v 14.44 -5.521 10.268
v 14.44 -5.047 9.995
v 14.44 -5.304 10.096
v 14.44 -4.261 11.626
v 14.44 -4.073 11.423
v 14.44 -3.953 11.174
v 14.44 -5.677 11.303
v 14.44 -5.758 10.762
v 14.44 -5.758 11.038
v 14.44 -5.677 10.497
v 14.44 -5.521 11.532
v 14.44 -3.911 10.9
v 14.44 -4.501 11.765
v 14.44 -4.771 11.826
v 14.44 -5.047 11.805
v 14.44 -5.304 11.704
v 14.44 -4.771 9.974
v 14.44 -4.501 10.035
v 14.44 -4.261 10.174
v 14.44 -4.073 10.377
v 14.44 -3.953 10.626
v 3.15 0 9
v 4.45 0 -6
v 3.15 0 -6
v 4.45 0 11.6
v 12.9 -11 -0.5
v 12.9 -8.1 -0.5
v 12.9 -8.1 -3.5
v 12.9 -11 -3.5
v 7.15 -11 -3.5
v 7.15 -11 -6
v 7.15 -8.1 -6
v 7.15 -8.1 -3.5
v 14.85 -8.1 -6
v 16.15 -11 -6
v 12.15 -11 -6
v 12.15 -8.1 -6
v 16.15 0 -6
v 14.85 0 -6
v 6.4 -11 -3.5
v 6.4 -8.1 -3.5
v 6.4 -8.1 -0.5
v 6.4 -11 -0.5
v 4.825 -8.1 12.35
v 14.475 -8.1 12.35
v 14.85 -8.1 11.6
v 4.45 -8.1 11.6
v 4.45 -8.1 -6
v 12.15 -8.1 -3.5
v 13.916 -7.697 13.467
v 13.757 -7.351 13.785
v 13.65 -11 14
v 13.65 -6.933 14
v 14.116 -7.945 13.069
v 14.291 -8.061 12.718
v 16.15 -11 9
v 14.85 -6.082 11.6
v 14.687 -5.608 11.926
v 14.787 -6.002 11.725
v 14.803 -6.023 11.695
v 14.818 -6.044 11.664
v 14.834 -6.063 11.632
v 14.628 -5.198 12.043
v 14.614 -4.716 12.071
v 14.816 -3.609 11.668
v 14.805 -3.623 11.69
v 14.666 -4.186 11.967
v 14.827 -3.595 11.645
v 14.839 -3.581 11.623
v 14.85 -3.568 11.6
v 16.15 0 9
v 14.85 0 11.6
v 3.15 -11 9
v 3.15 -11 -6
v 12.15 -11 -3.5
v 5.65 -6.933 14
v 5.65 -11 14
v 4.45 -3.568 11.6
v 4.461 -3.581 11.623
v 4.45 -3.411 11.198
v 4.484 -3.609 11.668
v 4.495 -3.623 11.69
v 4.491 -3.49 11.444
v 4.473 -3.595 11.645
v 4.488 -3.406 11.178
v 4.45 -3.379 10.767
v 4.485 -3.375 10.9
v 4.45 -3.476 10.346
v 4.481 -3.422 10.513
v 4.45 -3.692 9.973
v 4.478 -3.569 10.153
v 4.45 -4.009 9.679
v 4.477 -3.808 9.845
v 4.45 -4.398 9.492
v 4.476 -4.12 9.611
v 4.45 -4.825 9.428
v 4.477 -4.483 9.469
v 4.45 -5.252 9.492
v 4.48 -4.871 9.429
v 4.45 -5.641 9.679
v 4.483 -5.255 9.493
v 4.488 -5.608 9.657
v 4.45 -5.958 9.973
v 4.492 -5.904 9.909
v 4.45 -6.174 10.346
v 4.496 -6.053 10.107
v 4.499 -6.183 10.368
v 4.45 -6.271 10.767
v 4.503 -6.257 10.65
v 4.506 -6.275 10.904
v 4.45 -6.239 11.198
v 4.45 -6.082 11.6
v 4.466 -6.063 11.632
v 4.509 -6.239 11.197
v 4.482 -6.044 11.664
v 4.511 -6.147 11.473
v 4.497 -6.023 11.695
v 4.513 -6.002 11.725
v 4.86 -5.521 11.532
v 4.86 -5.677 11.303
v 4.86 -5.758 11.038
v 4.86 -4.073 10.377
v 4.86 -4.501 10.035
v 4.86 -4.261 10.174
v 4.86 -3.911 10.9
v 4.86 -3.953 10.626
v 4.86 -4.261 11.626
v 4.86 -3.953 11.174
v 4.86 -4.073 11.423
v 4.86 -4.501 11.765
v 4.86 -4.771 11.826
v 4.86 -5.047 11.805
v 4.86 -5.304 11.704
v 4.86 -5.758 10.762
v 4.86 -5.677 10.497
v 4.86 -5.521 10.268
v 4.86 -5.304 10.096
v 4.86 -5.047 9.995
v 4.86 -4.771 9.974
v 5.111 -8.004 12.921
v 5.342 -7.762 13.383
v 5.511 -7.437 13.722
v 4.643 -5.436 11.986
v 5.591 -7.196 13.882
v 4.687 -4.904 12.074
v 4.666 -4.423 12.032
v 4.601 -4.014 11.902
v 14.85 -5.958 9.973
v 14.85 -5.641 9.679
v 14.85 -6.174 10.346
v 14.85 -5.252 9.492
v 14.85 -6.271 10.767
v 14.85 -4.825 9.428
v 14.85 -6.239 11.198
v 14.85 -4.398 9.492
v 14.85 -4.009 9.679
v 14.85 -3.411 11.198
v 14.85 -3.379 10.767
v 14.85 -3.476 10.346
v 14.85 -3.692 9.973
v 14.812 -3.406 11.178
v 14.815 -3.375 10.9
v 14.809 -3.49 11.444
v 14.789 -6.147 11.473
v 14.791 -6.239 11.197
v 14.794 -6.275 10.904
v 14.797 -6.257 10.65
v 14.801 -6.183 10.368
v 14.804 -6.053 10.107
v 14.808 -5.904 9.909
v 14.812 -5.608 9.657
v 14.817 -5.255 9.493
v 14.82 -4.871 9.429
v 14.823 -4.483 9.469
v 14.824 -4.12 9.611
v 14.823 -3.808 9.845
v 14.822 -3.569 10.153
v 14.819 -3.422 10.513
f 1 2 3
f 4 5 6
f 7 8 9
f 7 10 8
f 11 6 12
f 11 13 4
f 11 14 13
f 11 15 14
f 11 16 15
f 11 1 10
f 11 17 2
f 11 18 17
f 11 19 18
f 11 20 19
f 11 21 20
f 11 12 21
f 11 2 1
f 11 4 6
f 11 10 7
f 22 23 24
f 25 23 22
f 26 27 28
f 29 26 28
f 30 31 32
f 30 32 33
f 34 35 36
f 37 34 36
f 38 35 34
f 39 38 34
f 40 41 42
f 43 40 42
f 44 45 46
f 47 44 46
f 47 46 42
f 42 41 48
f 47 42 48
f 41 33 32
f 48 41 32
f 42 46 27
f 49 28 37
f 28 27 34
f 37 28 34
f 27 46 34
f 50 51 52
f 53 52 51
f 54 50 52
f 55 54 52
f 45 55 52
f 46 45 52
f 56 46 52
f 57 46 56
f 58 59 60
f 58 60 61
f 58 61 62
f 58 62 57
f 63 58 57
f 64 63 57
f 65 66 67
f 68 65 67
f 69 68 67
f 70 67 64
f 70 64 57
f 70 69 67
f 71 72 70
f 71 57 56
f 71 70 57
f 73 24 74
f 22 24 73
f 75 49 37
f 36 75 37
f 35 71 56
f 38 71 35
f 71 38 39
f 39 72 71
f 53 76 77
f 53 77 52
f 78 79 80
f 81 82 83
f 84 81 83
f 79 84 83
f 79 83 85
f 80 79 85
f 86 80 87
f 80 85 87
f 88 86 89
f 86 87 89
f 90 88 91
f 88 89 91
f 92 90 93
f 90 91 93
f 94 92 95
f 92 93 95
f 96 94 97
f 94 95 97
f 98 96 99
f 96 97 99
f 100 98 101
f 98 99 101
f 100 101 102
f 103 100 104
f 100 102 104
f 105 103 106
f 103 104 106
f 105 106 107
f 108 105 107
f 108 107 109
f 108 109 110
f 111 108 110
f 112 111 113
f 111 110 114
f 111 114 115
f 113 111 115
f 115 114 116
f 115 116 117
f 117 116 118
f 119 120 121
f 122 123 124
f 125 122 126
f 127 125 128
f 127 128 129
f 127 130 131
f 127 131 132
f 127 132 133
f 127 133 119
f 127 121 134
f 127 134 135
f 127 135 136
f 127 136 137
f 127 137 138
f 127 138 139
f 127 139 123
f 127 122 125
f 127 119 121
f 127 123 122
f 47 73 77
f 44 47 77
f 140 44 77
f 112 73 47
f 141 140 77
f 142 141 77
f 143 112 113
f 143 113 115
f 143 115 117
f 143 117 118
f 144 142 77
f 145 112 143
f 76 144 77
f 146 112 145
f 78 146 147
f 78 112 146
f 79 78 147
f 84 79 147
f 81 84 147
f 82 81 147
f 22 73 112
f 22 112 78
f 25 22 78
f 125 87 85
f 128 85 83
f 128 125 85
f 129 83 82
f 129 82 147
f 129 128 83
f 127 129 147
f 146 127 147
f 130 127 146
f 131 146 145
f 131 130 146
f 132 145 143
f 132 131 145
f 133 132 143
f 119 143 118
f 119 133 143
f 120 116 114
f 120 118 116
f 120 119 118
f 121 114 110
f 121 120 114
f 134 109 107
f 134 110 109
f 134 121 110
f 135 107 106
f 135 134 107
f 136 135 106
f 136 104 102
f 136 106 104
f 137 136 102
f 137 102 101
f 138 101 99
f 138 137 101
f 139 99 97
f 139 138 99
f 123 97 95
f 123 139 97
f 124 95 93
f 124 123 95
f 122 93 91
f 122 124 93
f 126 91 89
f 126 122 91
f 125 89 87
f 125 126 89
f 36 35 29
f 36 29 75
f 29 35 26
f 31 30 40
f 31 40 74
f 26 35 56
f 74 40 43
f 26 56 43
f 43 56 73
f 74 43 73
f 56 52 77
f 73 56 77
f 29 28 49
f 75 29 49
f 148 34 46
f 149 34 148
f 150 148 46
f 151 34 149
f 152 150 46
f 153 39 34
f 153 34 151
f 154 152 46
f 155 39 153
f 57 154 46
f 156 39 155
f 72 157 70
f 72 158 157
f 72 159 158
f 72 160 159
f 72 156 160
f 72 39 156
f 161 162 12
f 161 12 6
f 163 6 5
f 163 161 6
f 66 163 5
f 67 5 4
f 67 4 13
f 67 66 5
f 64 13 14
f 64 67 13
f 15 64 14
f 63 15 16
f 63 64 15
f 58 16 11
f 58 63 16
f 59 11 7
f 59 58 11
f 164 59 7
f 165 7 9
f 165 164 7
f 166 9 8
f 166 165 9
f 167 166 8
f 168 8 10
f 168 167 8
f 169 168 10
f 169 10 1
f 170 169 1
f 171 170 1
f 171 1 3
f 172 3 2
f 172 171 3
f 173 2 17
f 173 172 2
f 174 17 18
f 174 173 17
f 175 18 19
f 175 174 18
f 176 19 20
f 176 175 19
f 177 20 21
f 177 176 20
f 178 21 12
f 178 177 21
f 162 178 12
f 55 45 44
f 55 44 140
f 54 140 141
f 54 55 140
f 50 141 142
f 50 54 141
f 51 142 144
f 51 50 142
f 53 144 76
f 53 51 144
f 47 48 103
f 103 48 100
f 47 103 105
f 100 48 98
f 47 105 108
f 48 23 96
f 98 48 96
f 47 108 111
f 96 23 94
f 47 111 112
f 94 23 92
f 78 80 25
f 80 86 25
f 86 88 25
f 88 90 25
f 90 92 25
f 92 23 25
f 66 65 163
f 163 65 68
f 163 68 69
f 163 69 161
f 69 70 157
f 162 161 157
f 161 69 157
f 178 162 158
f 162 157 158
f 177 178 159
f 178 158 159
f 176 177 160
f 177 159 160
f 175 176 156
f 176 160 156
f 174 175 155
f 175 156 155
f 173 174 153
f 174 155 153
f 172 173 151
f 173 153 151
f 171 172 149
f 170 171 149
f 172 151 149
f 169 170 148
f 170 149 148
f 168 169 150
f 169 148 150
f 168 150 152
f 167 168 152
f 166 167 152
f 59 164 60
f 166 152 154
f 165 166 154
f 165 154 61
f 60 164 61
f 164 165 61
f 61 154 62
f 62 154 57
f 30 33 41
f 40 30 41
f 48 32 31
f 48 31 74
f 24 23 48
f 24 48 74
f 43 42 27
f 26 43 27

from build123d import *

# Parameters (mm, degrees)
SKETCH256_R             = 1.45
PAD243_DEPTH            = 10.4
SKETCH257_W             = 2.9
SKETCH257_H             = 4.1
PAD244_DEPTH            = 3
SKETCH258_W             = 0.8
SKETCH258_H             = 6.4
PAD245_DEPTH            = 10
PAD246_DEPTH            = 3
BODY085_PLACEMENT_ANGLE = 90
PAD242_DEPTH            = 11


with BuildPart() as body086:
    # Sketch260 → Revolution010 (revolve)
    with BuildSketch(Plane.XY):
        Polygon((5.19, 1.5), (-5.19, 1.5), (-4.79, 0.928741), (-4.79, 0), (4.79, 0), (4.79, 0.928741), align=None)
    revolve(axis=Axis((0, 0, 0), (1, 0, 0)))


with BuildPart() as body086_1:
    # Body086 placement: moved
    add(body086.part.moved(Location((9.65, -4.84, 10.9))))


with BuildPart() as switch039:
    # Sketch256 → Pad243 (new body)
    with BuildSketch(Plane.XY):
        with BuildLine():
            ThreePointArc((-12.35, 8.1), (-13.587437, 7.587437), (-14.1, 6.35))
            Line((-14.1, -6.35), (-14.1, 6.35))
            ThreePointArc((-14.1, -6.35), (-13.587437, -7.587437), (-12.35, -8.1))
            Line((12.35, -8.1), (-12.35, -8.1))
            ThreePointArc((12.35, -8.1), (13.587437, -7.587437), (14.1, -6.35))
            Line((14.1, 6.35), (14.1, -6.35))
            ThreePointArc((14.1, 6.35), (13.587437, 7.587437), (12.35, 8.1))
            Line((-12.35, 8.1), (12.35, 8.1))
        make_face()
        with Locations((10.877931, -4.825)):
            Circle(SKETCH256_R, mode=Mode.SUBTRACT)
        with Locations((-10.877931, 4.825)):
            Circle(SKETCH256_R, mode=Mode.SUBTRACT)
    extrude(amount=PAD243_DEPTH)

    # Sketch257 (on Face8 of Pad243) → Pad244 (join)
    with BuildSketch(Plane(origin=(0, 8.1, 0), x_dir=(-1, 0, 0), z_dir=(0, 1, 0))):
        with Locations((-9.45, 5.2)):
            Rectangle(SKETCH257_W, SKETCH257_H)
    extrude(amount=PAD244_DEPTH)

    # Sketch258 (on Face3 of Pad244) → Pad245 (join)
    with BuildSketch(Plane(origin=(-14.1, 0, 0), x_dir=(0, -1, 0), z_dir=(-1, 0, 0))):
        with Locations((4.3, 5.2)):
            Rectangle(SKETCH258_W, SKETCH258_H)
    extrude(amount=PAD245_DEPTH)

    # Sketch259 (on Face16 of Pad245) → Pad246 (join)
    with BuildSketch(Plane.XZ.offset(8.1)):
        Polygon((-3.5, 8.45), (-0.5, 8.45), (-0.5, 1.95), (-3.5, 1.95), (-3.5, 2.7), (-9.5, 2.7), (-9.5, 7.7), (-3.5, 7.7), align=None)
    extrude(amount=PAD246_DEPTH)


with BuildPart() as switch039_1:
    # Body085 placement: moved
    add(switch039.part.moved(Location((14.15, 0, 0))).rotate(Axis((14.15, 0, 0), (0, -1, 0)), BODY085_PLACEMENT_ANGLE))


with BuildPart() as cut028:
    # Sketch255 → Pad242 (new body)
    with BuildSketch(Plane.XZ):
        Polygon((-4, 7.5), (4, 7.5), (6.5, 2.5), (6.5, -12.5), (-6.5, -12.5), (-6.5, 2.5), align=None)
    extrude(amount=PAD242_DEPTH)


with BuildPart() as cut028_1:
    # Body084 placement: moved
    add(cut028.part.moved(Location((8.95, 0, 6.5))))

    # Cut027: cut switch039
    add(switch039_1.part, mode=Mode.SUBTRACT)


with BuildPart() as cut028_2:
    # Cut027 placement: moved
    add(cut028_1.part.moved(Location((0.7, 0, 0))))

    # Cut028: cut Body086
    add(body086_1.part, mode=Mode.SUBTRACT)


solid = cut028_2.part
